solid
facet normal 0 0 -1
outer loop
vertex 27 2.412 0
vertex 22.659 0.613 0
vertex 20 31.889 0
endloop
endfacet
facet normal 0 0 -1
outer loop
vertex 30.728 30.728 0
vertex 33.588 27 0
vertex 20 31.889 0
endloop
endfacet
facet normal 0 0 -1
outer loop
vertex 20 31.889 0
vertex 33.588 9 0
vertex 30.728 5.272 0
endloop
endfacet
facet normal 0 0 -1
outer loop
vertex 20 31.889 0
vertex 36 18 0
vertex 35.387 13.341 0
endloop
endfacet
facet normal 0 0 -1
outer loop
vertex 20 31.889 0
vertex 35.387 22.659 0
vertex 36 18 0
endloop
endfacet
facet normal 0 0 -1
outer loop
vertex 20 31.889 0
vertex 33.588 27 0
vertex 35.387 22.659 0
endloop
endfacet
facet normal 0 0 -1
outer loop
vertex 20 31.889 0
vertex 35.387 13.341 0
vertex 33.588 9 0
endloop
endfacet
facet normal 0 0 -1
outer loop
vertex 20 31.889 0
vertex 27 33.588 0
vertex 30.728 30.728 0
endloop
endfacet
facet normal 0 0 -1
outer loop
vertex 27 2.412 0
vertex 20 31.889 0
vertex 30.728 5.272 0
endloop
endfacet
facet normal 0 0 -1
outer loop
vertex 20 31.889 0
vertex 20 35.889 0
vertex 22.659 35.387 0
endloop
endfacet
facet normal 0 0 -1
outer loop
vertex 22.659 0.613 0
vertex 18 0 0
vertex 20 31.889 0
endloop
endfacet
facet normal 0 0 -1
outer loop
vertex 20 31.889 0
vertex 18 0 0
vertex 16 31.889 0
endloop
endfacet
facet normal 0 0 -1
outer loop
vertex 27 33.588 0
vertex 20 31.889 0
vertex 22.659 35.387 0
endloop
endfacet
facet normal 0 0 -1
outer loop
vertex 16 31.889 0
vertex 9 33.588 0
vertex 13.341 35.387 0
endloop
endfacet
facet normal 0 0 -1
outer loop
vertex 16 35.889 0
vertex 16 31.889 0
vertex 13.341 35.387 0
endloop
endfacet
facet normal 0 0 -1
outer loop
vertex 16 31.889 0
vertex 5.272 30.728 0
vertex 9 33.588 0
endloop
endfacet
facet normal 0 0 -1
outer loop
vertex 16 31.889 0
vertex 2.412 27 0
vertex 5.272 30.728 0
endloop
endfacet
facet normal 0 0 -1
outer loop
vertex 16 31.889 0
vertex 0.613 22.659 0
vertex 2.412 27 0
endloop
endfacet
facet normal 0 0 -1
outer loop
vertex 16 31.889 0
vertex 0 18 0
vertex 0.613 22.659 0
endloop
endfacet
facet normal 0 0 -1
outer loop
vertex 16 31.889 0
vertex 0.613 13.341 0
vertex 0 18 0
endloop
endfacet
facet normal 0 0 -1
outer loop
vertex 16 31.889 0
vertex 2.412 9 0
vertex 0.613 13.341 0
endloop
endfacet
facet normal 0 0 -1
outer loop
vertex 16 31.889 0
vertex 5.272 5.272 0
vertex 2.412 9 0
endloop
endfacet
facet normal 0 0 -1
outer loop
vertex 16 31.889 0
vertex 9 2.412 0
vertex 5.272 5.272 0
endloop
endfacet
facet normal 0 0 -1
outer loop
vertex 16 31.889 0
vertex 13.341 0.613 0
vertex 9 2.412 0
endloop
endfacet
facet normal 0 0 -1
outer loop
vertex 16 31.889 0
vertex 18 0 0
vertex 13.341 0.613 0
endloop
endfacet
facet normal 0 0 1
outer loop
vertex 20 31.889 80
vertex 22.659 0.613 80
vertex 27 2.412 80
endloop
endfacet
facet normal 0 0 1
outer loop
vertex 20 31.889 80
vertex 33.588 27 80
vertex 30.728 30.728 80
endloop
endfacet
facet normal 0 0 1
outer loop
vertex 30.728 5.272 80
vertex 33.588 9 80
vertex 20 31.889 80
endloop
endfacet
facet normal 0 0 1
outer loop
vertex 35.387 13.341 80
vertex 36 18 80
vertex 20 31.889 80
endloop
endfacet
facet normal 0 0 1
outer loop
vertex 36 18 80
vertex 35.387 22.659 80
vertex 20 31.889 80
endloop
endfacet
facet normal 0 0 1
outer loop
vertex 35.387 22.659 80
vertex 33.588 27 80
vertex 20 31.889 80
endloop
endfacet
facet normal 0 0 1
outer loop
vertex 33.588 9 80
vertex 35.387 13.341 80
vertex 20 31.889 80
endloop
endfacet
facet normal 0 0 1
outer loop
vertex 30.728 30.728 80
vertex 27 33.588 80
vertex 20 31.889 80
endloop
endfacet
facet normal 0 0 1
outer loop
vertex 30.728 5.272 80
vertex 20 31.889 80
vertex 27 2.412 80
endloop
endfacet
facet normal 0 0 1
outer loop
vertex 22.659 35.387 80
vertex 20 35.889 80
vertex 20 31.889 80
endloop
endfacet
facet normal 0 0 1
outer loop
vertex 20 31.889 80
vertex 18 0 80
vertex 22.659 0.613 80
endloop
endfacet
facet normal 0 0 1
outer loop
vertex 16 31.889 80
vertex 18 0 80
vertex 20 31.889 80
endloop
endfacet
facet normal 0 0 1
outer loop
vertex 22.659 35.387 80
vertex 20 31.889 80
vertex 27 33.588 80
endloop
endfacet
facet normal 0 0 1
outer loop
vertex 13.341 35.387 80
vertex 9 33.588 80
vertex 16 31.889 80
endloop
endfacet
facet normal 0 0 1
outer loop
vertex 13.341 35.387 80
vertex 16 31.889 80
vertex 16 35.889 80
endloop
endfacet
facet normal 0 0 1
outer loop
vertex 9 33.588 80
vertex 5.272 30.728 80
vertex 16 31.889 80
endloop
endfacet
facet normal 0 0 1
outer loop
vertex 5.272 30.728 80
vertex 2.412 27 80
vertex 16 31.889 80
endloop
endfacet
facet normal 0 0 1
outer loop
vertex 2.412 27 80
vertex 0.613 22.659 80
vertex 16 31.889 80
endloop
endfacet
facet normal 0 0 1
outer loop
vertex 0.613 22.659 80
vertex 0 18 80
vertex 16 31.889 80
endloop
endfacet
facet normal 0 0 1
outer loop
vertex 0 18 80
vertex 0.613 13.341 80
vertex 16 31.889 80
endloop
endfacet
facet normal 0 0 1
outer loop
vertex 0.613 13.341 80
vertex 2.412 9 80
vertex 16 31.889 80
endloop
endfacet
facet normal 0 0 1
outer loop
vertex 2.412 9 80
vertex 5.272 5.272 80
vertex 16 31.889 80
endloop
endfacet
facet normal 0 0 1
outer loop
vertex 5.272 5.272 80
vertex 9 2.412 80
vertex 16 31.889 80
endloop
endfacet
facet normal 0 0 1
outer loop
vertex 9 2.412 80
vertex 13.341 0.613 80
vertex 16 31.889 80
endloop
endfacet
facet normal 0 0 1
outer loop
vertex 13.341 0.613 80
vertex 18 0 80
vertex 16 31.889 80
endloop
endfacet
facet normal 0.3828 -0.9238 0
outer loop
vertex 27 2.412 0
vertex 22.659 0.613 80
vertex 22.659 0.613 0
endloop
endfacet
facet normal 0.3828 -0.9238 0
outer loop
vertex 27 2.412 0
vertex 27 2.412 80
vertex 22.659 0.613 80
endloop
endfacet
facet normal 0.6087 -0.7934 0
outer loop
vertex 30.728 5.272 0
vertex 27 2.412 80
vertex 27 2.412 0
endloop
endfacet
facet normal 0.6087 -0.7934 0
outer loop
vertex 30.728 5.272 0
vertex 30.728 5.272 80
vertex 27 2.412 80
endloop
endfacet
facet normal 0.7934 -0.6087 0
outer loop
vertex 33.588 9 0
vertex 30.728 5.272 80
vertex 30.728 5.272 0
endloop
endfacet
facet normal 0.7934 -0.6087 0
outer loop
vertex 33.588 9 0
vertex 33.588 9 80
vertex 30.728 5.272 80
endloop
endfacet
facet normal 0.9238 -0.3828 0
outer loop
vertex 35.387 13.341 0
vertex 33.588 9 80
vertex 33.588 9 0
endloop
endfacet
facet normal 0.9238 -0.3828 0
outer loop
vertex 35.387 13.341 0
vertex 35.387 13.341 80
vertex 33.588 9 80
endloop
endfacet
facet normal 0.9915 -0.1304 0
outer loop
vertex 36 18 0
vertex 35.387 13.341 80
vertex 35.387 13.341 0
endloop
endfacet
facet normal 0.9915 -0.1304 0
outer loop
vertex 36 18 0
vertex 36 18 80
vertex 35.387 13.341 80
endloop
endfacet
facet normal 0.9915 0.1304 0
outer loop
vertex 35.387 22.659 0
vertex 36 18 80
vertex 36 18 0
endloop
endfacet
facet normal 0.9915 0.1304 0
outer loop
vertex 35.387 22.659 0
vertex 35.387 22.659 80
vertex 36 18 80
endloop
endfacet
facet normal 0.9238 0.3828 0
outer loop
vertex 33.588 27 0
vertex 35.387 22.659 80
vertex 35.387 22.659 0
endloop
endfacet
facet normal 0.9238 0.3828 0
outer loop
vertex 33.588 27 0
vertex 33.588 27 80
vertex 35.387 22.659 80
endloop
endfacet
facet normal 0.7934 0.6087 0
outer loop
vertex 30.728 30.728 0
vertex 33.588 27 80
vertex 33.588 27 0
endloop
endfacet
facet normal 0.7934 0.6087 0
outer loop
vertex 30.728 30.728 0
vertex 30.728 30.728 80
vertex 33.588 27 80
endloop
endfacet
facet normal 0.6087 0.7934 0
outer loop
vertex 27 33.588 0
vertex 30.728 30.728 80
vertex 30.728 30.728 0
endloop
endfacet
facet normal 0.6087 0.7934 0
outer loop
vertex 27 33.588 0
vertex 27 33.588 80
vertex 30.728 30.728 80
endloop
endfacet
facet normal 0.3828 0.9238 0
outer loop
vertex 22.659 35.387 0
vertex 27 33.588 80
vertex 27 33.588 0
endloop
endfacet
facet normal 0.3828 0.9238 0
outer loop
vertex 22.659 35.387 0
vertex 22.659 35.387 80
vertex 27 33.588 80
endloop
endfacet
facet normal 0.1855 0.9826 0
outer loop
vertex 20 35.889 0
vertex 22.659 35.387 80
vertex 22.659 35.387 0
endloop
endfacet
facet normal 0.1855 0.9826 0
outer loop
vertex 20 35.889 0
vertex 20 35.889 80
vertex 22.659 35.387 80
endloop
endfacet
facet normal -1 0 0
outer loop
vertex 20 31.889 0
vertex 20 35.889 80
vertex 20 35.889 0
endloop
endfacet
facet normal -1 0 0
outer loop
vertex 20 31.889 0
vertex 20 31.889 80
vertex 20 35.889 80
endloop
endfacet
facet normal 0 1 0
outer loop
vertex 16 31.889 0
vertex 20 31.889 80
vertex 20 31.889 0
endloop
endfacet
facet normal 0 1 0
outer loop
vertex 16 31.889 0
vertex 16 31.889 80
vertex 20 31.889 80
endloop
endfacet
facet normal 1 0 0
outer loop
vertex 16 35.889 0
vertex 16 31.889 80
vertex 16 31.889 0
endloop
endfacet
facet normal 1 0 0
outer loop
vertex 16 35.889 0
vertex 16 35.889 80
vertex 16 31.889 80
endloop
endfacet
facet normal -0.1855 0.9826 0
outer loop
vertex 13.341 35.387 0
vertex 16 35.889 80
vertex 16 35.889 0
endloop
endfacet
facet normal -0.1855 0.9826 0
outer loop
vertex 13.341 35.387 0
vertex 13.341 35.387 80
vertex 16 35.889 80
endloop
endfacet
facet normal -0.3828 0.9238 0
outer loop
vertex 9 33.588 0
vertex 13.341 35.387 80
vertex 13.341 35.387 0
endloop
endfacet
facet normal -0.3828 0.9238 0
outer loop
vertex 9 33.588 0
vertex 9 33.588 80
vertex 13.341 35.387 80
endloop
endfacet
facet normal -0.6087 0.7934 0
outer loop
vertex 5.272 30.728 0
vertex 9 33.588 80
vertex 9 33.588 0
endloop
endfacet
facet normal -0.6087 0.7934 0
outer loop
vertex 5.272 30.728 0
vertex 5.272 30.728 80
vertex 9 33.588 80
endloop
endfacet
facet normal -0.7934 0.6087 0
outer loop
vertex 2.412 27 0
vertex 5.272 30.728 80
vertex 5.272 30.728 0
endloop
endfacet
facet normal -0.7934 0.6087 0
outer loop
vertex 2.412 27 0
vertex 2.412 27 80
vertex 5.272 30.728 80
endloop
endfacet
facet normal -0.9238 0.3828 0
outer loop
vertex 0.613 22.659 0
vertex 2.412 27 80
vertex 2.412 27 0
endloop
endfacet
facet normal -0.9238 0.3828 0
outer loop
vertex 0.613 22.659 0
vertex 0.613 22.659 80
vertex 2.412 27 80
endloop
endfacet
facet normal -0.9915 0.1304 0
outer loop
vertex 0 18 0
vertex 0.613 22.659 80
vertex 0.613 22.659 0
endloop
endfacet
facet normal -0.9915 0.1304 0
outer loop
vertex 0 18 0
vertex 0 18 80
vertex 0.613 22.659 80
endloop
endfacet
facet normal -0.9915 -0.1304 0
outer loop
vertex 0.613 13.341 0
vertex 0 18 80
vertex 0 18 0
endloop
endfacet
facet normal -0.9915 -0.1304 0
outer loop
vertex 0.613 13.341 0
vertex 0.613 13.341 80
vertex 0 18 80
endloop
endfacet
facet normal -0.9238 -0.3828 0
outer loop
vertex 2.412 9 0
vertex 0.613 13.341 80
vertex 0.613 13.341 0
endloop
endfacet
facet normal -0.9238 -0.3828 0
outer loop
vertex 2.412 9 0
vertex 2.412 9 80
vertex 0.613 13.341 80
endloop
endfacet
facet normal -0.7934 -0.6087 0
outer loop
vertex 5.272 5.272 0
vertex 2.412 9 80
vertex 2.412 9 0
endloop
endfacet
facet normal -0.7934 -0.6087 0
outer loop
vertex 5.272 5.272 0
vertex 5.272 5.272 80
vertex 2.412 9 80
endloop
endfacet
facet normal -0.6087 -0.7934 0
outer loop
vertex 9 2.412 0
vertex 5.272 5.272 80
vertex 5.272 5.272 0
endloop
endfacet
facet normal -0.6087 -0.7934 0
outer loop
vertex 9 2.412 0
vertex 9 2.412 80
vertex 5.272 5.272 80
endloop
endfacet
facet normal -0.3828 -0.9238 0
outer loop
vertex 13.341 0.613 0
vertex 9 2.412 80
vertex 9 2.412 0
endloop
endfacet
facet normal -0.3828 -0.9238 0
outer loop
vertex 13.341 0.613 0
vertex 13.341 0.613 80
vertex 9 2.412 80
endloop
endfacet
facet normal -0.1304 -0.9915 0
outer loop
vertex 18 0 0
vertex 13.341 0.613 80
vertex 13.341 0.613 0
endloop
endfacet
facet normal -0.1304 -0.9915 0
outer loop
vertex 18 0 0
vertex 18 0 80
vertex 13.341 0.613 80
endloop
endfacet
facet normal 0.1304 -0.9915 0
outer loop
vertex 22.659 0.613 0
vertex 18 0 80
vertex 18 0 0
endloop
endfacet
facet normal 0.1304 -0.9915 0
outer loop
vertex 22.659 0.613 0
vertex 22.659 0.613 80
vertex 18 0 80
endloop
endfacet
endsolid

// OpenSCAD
$fn = 32;

// ----------------------------------------------------------------------
// Keyway shaft: d36 shaft, key 4 x 4 mm
// ----------------------------------------------------------------------

// --- parameters (mm) ---
shaft_r = 18;             // shaft radius
key_w = 4;                // keyway width
key_d = 4;                // keyway depth below the surface line
plate_t = 80;             // shaft length, Z (extrusion height)

shaft_d = 2 * shaft_r;  // shaft diameter
circle_step = 15;  // polygon sampling step, degrees

profile = [[13.341, 35.387], [9, 33.588], [5.272, 30.728], [2.412, 27], [0.613, 22.659], [0, 18], [0.613, 13.341], [2.412, 9], [5.272, 5.272], [9, 2.412], [13.341, 0.613], [18, 0], [22.659, 0.613], [27, 2.412], [30.728, 5.272], [33.588, 9], [35.387, 13.341], [36, 18], [35.387, 22.659], [33.588, 27], [30.728, 30.728], [27, 33.588], [22.659, 35.387], [20, 35.889], [20, 31.889], [16, 31.889], [16, 35.889]];  // primary outline, 27 points, counter clockwise

// --- the one profile operation ---
linear_extrude(height = plate_t) polygon(points = profile);
